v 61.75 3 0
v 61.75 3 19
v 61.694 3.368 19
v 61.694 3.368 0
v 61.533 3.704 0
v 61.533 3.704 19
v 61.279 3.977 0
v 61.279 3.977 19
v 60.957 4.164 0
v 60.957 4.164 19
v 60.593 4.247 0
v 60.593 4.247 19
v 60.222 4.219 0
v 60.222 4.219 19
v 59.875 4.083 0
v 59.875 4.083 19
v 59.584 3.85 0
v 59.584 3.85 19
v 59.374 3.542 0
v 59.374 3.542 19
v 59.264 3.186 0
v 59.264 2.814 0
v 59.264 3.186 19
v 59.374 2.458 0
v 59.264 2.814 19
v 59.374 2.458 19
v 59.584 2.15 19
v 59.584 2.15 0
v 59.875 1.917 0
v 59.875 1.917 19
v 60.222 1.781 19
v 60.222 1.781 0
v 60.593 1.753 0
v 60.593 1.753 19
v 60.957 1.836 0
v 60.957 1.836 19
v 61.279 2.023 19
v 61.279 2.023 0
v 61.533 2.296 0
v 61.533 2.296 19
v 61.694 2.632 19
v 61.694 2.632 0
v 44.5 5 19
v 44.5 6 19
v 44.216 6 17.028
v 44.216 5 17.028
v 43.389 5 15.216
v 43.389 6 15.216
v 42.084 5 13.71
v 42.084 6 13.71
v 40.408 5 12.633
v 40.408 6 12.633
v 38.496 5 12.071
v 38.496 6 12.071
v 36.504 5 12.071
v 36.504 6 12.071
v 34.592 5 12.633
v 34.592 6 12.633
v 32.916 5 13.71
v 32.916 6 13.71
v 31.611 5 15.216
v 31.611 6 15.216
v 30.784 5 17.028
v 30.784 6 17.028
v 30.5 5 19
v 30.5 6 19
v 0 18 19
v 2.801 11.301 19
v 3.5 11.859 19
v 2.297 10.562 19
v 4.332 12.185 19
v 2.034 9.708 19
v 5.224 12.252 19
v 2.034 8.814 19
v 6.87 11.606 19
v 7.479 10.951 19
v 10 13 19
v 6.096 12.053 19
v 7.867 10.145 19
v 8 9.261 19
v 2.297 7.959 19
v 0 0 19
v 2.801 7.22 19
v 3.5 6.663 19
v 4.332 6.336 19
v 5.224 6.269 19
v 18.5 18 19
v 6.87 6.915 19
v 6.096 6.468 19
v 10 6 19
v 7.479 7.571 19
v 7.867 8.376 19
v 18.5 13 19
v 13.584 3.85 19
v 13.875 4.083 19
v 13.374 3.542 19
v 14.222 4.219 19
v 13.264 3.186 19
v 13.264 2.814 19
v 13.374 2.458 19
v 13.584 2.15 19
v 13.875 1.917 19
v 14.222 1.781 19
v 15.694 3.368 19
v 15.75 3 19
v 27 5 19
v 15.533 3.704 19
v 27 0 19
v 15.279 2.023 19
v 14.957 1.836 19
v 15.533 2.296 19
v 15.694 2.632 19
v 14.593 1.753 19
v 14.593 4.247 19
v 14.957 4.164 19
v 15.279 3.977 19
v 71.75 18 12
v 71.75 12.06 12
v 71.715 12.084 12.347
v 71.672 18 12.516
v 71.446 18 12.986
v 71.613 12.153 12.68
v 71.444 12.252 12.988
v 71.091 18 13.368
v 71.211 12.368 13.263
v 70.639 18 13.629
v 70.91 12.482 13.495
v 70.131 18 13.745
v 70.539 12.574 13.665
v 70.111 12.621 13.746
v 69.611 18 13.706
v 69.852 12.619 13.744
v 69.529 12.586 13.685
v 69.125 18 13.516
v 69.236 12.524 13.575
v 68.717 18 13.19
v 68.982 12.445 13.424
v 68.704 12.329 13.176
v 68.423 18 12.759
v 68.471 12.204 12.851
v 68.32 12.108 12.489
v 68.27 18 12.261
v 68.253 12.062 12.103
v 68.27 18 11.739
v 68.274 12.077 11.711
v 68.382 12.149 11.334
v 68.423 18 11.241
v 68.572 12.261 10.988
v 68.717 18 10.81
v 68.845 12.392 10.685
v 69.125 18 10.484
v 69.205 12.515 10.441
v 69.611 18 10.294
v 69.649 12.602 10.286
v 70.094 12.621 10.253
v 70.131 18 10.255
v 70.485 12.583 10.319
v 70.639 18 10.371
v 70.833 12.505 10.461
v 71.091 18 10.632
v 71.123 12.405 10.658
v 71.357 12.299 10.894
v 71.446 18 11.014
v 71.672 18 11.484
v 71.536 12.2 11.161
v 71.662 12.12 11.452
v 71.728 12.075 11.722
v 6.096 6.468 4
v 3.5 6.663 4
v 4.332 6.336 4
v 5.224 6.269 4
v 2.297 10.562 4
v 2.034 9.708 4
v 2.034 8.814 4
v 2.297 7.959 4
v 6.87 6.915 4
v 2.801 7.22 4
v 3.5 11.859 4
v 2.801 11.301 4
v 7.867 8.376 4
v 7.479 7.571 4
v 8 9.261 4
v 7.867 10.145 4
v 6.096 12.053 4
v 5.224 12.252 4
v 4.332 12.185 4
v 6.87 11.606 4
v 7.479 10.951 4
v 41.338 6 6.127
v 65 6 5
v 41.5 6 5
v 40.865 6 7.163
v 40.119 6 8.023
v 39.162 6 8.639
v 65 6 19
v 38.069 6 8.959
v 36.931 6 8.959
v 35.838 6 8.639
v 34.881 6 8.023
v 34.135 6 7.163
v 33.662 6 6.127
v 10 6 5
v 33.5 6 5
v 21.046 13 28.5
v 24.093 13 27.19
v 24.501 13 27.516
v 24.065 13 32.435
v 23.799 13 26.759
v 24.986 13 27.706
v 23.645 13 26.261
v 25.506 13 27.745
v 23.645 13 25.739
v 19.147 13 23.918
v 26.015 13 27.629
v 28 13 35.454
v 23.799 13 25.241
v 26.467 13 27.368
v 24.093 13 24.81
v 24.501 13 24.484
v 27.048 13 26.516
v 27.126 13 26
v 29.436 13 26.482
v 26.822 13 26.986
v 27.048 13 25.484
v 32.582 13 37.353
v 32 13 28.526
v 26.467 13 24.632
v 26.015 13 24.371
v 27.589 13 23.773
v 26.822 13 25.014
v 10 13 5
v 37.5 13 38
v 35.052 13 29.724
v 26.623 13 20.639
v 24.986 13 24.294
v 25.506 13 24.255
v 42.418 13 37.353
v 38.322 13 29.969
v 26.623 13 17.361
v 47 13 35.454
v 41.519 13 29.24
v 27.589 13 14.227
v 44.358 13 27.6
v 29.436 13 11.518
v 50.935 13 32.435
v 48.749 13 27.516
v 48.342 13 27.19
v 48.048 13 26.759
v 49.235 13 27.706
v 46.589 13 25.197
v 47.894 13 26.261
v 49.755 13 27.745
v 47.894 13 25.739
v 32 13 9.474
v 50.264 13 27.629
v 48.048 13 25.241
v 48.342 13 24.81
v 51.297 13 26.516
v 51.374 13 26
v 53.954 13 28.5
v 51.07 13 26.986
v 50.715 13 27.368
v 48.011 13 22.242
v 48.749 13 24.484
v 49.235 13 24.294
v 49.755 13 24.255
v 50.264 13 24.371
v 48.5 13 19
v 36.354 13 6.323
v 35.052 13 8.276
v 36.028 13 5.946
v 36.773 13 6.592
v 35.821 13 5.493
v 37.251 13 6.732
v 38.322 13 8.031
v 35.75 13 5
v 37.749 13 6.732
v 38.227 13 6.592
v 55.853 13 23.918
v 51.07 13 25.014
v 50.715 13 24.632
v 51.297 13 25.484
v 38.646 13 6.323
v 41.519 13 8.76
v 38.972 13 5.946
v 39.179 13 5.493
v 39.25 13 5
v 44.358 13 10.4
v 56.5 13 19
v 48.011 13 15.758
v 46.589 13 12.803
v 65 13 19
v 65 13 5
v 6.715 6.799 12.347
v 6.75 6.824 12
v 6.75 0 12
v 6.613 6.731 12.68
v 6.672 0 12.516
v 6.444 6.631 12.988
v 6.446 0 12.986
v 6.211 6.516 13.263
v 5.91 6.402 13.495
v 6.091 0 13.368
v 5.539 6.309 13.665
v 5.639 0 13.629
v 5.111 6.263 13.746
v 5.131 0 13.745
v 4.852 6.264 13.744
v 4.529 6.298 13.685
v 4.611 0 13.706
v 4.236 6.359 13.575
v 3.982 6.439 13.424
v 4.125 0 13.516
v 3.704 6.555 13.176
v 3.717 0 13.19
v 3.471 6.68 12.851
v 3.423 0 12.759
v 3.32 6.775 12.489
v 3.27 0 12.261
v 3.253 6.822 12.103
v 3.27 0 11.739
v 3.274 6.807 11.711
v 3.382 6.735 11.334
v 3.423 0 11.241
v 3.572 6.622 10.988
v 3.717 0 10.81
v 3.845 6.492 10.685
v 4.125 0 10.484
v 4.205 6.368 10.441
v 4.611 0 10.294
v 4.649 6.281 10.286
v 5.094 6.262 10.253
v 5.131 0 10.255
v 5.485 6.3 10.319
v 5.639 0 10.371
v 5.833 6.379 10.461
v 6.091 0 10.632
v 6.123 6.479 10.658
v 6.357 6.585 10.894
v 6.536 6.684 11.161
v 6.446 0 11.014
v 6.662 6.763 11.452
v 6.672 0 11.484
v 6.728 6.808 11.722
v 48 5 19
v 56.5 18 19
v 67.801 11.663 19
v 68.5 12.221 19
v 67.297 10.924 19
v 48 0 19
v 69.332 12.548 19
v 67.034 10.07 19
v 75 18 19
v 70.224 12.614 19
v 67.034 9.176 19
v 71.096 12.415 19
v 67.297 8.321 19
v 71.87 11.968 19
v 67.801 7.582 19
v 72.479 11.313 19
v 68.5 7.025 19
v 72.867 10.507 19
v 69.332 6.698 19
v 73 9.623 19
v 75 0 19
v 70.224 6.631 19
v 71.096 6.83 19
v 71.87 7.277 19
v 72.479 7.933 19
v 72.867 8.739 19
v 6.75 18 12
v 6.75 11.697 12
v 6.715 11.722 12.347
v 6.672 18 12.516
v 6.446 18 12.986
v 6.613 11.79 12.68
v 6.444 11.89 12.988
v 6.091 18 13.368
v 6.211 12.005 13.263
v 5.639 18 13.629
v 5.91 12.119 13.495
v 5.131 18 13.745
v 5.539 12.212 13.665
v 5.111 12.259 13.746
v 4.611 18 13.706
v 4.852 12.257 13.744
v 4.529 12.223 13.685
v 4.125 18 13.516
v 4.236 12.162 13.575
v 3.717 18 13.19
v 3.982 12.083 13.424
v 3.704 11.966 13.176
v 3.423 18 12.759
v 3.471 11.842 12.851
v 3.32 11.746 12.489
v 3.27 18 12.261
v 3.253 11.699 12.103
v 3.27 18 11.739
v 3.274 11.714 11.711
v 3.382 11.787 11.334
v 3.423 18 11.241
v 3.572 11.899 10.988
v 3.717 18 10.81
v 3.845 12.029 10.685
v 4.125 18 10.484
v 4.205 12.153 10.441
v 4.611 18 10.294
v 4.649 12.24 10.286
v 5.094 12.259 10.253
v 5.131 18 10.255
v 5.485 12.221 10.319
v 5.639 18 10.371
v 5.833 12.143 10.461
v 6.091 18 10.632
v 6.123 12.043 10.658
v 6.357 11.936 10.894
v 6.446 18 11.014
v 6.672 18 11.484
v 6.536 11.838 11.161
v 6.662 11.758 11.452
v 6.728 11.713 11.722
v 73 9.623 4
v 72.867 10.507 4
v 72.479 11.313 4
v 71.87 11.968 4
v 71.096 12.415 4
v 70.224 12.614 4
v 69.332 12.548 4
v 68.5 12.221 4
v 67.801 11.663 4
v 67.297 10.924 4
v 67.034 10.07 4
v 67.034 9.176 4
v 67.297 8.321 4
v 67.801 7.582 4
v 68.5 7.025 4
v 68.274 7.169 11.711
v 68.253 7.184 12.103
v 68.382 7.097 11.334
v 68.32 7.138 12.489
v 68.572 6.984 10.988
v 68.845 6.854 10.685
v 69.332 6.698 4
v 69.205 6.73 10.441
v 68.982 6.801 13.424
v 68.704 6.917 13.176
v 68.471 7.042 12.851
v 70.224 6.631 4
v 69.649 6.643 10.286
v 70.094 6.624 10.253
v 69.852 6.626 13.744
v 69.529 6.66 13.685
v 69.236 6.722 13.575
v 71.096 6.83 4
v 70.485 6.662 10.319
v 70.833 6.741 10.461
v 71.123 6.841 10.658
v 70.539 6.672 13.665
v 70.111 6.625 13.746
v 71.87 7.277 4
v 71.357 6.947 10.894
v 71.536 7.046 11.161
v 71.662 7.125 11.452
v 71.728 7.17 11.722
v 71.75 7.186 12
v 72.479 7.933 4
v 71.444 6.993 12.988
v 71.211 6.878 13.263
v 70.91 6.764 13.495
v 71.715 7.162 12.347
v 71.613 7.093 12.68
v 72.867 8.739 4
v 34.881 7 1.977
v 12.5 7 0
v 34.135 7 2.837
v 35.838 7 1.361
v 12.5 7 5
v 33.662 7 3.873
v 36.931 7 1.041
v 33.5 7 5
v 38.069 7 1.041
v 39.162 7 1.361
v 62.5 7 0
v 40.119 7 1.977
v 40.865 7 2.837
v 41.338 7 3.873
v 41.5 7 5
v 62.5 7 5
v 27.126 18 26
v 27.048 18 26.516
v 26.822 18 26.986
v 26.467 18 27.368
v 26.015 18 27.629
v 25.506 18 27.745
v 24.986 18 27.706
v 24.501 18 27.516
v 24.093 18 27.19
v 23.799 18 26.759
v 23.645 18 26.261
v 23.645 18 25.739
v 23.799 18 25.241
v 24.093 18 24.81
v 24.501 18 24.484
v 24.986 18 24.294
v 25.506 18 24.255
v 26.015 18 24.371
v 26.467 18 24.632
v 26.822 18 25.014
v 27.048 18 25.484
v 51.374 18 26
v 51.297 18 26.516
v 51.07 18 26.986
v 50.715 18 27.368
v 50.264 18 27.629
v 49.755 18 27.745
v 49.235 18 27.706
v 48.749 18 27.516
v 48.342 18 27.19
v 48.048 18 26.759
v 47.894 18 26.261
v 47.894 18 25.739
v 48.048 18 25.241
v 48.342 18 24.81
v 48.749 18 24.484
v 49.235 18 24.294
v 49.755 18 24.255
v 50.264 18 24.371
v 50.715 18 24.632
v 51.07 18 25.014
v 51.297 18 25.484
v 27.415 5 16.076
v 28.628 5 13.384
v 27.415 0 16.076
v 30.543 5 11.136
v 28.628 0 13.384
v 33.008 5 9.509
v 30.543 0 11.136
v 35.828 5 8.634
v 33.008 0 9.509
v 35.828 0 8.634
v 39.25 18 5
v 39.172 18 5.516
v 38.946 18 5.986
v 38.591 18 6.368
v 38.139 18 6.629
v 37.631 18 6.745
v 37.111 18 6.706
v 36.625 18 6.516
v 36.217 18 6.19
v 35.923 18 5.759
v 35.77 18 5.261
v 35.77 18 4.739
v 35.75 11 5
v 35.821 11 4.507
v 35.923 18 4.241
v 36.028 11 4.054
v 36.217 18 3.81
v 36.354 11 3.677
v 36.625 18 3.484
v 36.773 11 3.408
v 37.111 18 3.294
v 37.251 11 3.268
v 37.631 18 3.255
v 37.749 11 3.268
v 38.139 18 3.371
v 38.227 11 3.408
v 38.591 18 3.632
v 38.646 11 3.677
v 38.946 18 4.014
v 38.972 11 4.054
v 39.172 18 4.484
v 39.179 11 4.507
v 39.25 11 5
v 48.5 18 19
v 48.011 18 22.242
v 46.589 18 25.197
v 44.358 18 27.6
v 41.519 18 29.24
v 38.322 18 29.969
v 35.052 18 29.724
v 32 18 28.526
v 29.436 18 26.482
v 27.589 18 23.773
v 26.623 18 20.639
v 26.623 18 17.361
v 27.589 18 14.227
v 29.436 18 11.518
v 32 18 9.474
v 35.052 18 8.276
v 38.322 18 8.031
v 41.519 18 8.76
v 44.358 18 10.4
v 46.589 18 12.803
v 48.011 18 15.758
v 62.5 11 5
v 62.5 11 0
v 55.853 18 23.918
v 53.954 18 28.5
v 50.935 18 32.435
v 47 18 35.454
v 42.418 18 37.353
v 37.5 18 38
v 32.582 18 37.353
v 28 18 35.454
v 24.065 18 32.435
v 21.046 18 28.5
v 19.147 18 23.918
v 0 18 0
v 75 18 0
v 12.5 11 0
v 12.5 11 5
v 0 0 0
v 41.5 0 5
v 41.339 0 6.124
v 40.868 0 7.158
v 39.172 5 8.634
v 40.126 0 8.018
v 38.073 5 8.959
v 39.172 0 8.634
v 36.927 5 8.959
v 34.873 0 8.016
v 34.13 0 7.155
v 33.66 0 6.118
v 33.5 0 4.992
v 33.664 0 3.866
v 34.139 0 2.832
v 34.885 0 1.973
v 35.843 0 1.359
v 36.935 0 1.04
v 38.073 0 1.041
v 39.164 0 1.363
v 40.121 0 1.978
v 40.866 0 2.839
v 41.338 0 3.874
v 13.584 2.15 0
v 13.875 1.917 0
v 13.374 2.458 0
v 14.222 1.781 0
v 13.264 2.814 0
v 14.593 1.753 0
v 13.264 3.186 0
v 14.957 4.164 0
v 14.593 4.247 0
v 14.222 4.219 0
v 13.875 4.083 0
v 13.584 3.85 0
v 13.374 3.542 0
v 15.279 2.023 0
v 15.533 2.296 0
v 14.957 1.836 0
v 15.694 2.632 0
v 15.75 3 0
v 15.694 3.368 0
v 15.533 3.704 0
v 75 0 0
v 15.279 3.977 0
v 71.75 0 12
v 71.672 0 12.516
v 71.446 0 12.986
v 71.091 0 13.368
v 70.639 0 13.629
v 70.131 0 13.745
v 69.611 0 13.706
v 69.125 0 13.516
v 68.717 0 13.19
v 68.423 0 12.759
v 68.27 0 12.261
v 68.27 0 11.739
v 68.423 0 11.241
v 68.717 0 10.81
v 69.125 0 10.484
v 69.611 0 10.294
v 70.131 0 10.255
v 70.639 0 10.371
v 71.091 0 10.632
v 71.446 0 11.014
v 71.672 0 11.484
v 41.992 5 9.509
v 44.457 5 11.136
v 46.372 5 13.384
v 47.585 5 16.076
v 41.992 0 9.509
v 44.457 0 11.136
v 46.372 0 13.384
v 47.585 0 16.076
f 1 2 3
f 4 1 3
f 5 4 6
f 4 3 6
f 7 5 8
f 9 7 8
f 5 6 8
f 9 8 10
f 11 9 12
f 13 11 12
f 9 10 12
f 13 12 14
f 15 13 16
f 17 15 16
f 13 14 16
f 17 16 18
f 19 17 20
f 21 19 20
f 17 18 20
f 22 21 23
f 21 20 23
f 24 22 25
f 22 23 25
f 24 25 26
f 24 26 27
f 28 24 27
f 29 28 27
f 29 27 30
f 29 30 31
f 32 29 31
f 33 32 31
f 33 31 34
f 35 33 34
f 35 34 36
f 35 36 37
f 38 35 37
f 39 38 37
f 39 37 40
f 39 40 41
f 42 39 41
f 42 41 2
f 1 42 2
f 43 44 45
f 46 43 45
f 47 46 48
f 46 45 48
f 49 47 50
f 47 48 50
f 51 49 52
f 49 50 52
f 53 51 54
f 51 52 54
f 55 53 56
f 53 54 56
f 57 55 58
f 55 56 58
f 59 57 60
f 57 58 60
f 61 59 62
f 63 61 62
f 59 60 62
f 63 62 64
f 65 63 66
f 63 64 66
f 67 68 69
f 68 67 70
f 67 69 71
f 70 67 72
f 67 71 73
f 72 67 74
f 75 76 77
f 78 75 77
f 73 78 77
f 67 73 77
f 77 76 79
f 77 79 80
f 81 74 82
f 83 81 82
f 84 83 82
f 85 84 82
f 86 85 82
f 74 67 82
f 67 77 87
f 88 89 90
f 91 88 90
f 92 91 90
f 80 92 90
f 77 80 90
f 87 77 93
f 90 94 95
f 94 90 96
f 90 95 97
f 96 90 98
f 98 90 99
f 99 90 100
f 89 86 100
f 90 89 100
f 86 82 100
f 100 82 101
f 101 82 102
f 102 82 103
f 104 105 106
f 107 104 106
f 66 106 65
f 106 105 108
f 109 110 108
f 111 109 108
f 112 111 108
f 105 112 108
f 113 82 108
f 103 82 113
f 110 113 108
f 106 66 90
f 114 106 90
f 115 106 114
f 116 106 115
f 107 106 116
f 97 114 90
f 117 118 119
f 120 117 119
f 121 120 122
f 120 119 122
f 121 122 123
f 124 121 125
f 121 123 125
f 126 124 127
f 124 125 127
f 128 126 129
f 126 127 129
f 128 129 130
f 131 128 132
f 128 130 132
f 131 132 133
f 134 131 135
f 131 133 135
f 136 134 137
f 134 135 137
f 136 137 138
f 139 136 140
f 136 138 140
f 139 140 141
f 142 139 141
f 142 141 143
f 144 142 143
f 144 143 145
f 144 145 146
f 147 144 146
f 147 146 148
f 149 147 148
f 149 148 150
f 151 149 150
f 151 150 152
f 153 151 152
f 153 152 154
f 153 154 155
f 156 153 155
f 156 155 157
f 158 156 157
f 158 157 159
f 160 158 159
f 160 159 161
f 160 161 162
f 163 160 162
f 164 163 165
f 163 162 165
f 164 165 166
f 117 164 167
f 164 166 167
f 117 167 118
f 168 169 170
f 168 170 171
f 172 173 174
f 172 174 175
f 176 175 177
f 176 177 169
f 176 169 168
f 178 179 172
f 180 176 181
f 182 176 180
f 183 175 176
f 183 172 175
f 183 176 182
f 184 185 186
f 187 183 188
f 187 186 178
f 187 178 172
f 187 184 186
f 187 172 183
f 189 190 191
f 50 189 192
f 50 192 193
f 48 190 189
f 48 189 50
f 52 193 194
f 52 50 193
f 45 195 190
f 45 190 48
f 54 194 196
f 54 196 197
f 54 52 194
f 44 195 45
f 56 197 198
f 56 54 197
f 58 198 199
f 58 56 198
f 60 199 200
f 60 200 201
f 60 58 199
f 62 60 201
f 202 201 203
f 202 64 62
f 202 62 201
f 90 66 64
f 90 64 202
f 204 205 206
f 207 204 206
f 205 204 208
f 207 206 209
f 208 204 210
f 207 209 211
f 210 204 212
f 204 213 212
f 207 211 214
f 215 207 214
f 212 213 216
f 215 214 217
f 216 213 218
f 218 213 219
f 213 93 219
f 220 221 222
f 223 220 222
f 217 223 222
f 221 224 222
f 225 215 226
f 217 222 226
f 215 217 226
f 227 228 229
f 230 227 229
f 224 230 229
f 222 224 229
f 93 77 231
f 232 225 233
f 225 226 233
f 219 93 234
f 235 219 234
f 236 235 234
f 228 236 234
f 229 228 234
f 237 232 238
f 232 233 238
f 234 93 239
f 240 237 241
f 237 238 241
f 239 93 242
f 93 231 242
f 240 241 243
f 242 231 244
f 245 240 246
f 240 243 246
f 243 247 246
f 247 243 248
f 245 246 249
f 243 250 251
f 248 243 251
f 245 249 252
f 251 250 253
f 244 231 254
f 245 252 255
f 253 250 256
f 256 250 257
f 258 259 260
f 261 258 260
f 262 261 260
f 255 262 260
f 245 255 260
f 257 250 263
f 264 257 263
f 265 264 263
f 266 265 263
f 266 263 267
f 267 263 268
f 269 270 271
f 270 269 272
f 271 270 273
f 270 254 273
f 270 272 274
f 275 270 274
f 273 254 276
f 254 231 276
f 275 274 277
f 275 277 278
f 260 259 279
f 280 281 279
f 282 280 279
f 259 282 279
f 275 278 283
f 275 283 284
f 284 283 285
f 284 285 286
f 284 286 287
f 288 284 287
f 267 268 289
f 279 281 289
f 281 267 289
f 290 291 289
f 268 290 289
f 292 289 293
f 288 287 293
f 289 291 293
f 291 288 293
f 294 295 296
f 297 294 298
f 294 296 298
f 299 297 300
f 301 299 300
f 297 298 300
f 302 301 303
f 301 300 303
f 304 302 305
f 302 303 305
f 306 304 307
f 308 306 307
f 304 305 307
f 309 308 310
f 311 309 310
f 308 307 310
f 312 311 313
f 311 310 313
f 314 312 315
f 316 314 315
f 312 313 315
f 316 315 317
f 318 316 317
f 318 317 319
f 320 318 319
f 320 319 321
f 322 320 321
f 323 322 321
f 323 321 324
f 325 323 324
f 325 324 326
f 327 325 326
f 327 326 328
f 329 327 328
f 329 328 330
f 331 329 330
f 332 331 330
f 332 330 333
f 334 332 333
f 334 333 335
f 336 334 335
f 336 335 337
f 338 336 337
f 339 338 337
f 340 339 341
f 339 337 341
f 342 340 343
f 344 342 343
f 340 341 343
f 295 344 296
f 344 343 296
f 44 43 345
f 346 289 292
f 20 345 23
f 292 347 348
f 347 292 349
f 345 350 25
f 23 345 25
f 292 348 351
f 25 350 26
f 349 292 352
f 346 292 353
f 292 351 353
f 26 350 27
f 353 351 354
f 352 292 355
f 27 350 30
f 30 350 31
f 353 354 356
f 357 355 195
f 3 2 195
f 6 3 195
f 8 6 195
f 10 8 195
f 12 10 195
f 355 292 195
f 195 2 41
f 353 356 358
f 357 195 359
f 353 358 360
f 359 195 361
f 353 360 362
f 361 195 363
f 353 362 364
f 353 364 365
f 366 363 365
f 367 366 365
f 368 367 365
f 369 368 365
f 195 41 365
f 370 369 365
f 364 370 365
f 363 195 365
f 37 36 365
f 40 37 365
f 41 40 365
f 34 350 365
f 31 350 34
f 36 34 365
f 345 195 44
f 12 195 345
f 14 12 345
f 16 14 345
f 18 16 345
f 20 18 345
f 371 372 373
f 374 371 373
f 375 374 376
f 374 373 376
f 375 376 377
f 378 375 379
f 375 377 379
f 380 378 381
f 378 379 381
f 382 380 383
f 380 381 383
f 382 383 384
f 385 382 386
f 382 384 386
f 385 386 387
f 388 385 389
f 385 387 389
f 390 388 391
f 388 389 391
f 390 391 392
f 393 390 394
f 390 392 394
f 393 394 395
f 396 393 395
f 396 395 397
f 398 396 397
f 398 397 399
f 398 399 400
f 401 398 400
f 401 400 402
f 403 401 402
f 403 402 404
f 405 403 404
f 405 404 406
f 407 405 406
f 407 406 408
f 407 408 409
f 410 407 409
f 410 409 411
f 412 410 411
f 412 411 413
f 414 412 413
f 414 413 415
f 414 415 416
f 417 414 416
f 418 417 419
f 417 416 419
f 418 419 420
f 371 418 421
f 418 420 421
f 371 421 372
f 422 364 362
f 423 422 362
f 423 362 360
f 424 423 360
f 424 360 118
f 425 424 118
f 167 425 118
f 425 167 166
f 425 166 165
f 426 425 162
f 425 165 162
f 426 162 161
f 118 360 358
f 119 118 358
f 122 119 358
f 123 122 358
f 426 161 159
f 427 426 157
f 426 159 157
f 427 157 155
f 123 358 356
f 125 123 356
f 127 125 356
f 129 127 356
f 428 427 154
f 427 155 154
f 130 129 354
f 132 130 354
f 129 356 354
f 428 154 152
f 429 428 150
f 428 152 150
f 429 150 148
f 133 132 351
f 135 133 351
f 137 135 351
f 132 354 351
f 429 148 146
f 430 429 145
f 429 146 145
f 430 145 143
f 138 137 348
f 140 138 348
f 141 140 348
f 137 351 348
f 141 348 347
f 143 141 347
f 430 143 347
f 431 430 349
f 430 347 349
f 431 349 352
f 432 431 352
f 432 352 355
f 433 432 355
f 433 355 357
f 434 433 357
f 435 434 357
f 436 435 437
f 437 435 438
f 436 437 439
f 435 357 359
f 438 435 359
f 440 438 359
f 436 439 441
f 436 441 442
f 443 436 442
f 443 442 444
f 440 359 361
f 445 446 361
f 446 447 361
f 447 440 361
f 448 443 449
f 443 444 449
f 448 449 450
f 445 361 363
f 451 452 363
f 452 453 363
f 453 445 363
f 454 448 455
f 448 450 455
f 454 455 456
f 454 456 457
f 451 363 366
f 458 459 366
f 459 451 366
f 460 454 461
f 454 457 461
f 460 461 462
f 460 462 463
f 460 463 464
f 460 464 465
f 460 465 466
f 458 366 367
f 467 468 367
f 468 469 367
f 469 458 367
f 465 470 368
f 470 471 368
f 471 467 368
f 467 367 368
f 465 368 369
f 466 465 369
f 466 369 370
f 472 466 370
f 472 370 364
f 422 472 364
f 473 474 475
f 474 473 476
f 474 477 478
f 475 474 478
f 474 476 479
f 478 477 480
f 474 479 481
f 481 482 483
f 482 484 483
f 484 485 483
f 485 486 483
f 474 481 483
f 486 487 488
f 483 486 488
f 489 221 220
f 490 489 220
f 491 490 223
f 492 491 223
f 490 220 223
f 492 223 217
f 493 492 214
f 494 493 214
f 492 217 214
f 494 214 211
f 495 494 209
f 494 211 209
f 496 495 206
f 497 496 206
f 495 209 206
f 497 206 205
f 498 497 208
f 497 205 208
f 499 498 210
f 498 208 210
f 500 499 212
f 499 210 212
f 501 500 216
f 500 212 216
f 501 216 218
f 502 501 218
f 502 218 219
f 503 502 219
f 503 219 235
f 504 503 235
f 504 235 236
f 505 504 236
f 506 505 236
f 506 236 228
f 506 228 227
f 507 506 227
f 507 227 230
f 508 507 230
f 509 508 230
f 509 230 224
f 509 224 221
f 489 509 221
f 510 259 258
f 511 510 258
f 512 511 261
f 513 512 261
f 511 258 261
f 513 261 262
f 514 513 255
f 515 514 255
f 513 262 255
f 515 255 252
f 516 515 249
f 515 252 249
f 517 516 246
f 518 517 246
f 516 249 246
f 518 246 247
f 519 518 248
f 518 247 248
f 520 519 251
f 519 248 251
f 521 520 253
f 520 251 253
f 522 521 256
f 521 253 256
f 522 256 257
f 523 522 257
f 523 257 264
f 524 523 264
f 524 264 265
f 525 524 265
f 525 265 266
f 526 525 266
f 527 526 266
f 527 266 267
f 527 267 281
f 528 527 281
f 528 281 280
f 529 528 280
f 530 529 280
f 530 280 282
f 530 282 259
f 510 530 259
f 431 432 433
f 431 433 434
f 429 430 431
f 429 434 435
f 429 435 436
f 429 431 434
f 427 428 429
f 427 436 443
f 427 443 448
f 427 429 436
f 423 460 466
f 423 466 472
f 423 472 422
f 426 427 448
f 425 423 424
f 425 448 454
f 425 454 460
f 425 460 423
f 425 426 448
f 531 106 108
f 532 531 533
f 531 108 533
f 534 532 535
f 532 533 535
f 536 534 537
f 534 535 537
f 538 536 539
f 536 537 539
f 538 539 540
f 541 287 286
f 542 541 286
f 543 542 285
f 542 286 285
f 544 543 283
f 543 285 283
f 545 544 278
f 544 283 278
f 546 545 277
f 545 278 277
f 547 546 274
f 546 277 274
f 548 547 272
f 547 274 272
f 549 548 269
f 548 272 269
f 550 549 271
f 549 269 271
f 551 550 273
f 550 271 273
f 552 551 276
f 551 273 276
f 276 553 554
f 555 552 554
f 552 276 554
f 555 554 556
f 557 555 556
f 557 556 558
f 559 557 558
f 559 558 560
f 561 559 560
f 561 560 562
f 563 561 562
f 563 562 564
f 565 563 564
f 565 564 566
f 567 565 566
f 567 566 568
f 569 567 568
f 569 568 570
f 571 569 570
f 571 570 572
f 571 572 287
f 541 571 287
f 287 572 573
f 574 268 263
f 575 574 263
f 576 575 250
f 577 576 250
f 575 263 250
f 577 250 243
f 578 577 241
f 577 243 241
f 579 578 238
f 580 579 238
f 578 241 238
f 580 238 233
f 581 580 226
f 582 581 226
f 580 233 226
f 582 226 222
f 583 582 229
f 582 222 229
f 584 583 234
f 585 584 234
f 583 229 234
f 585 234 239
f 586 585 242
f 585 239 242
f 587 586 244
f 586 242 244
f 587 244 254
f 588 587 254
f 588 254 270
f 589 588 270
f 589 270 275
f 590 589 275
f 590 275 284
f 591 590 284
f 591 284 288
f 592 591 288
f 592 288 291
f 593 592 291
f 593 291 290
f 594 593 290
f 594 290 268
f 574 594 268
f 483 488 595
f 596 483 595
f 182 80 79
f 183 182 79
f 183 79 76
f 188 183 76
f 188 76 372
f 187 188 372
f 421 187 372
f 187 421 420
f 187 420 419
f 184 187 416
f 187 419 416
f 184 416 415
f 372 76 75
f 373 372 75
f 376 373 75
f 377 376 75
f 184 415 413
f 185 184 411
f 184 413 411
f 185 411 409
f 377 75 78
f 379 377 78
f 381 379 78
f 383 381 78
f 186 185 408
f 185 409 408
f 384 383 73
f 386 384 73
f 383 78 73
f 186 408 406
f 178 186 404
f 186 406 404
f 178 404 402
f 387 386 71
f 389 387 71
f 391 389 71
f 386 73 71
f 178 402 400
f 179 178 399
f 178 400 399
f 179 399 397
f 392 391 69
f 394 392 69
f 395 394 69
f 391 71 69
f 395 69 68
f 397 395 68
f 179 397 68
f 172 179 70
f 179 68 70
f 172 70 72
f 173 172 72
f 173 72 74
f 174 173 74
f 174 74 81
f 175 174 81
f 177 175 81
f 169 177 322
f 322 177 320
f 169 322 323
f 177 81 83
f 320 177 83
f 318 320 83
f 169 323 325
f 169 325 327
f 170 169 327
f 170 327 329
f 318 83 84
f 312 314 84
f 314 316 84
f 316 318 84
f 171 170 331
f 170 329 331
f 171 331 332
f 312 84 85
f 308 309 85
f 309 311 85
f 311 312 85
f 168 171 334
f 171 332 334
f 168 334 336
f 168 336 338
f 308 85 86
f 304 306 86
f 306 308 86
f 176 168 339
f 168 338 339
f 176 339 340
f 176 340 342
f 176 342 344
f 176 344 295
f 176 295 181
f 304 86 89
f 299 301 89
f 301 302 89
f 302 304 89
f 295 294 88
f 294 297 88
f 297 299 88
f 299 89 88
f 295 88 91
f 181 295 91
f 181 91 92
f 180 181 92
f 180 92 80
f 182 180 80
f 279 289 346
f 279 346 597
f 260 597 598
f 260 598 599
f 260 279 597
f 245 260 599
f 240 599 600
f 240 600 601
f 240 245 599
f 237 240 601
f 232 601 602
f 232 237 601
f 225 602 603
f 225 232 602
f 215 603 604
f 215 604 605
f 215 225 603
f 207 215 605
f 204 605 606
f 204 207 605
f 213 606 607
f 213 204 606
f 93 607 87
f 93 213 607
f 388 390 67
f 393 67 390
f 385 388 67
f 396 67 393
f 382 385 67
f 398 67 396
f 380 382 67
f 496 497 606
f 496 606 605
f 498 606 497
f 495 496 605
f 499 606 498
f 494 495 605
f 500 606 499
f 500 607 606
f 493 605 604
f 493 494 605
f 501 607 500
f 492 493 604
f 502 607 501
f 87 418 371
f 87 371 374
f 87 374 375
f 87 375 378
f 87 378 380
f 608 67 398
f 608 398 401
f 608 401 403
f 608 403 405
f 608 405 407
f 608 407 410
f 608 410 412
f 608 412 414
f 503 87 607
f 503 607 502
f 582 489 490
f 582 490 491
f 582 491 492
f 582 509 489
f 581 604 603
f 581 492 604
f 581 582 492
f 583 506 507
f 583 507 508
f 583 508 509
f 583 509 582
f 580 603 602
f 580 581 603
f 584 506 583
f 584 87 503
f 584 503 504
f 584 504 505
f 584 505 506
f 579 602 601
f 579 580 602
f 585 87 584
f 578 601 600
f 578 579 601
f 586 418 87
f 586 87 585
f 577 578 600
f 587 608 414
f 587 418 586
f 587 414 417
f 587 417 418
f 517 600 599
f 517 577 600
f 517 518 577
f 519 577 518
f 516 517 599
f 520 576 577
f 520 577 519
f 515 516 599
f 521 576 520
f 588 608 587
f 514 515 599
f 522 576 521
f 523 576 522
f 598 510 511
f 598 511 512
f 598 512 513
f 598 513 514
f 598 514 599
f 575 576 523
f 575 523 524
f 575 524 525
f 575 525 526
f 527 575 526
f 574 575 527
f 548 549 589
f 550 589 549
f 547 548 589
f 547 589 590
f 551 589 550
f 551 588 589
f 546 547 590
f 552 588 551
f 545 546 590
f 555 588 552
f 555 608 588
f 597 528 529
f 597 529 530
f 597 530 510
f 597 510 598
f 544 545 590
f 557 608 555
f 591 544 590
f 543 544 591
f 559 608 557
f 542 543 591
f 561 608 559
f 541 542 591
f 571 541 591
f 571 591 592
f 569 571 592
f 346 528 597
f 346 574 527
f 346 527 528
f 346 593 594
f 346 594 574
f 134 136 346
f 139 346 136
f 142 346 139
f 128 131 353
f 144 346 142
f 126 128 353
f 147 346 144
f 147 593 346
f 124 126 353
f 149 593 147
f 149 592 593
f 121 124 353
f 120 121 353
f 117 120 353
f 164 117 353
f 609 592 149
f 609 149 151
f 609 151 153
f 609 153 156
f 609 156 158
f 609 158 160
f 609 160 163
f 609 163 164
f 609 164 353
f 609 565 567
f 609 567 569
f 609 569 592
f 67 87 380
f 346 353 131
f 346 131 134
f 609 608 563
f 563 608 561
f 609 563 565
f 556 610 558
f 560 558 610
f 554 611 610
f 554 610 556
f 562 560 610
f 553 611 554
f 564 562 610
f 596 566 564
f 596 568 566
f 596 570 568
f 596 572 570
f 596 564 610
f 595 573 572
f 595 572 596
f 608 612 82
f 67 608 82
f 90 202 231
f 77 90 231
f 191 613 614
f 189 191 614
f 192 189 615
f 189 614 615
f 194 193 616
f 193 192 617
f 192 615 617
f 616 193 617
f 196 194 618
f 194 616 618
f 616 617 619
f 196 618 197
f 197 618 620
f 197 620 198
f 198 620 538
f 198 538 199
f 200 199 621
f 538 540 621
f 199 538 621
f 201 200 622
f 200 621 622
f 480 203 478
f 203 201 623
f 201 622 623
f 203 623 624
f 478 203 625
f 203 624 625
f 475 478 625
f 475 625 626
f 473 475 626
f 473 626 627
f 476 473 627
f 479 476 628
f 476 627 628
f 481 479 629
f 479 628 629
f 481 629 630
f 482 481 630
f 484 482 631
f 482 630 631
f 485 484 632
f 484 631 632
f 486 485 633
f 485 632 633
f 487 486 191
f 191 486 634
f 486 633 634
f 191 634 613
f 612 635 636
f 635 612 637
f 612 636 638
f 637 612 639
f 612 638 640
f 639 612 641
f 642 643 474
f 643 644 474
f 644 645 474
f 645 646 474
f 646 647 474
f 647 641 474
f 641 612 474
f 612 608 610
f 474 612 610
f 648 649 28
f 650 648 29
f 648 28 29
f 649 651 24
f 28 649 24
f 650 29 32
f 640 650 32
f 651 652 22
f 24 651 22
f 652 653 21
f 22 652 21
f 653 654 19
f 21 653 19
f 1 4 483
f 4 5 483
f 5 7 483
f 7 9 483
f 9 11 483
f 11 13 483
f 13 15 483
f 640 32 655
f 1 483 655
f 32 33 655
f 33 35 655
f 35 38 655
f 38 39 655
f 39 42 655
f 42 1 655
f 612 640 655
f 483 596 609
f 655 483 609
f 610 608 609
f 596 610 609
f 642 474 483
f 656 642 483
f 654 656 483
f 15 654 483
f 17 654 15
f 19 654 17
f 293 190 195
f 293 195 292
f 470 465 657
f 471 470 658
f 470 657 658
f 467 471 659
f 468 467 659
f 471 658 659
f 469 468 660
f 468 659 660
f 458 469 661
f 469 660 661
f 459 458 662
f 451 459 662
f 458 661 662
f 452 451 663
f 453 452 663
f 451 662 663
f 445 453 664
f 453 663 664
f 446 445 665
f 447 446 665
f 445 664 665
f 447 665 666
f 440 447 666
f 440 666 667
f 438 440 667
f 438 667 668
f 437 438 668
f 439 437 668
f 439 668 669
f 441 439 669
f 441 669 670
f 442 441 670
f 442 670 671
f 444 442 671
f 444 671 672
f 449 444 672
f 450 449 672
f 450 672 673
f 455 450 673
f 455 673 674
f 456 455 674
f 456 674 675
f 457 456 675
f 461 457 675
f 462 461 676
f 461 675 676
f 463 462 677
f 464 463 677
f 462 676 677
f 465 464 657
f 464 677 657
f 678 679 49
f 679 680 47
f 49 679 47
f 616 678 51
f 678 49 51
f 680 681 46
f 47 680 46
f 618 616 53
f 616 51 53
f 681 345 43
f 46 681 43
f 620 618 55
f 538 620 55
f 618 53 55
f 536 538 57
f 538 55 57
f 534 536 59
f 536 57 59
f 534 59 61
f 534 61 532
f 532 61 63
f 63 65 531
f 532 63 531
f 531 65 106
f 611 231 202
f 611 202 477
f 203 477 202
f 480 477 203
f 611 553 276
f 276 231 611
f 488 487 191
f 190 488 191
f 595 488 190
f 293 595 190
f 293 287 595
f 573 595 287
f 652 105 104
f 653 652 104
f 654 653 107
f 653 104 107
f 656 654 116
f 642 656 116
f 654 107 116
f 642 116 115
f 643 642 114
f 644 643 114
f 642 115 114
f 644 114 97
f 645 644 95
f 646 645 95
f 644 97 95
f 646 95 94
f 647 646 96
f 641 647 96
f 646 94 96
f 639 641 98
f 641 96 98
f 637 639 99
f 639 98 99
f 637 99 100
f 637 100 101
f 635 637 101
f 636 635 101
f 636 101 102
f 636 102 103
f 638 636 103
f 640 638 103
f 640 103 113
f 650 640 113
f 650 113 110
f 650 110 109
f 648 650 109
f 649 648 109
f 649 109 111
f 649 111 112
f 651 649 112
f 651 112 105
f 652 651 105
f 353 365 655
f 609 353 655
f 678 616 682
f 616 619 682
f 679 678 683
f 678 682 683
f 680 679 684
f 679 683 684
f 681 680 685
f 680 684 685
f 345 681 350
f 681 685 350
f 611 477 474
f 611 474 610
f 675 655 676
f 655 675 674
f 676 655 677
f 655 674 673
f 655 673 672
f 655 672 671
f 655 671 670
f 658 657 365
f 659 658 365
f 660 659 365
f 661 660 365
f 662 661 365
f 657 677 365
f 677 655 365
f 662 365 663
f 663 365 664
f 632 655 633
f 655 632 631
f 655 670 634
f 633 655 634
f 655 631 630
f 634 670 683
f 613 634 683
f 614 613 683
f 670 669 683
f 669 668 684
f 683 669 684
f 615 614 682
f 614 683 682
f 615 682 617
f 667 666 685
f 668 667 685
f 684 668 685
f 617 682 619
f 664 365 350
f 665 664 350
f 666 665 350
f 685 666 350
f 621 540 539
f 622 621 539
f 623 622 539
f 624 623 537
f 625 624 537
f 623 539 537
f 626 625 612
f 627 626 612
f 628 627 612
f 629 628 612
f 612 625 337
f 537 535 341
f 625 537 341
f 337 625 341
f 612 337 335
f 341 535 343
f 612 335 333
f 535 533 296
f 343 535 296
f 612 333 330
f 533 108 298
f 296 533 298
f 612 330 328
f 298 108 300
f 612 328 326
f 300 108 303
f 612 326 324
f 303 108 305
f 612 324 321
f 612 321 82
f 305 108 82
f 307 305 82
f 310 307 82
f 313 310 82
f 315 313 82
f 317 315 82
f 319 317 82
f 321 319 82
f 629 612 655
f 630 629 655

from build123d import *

# Parameters (mm, degrees)
SKETCH_W        = 75
SKETCH_H        = 18
PAD_DEPTH       = 5
SKETCH001_W     = 50
SKETCH001_H     = 4
POCKET_DEPTH    = 5.001
SKETCH002_W     = 75
SKETCH002_H     = 5
PAD001_DEPTH    = 38
POCKET001_DEPTH = 5
SKETCH004_R     = 11
POCKET002_DEPTH = 5.001
SKETCH005_R     = 10.5
PAD002_DEPTH    = 6
SKETCH006_W     = 10
SKETCH006_H     = 18
PAD003_DEPTH    = 14
SKETCH007_R     = 3
POCKET003_DEPTH = 15
SKETCH008_R     = 16
SKETCH008_R_2   = 7
PAD004_DEPTH    = 1
SKETCH009_R     = 1.75
POCKET004_DEPTH = 18.001
SKETCH010_R     = 4
POCKET005_DEPTH = 8
SKETCH011_R     = 1.75
POCKET006_DEPTH = 18.001
SKETCH012_W     = 100
SKETCH012_H     = 30
POCKET007_DEPTH = 6
SKETCH013_R     = 1.25
HOLE_DEPTH      = 25


with BuildPart() as part:
    # Sketch → Pad (new body)
    with BuildSketch(Plane.XY):
        with Locations((37.5, 9)):
            Rectangle(SKETCH_W, SKETCH_H)
    extrude(amount=PAD_DEPTH)

    # Sketch001 (on Face6 of Pad) → Pocket (cut, through all)
    with BuildSketch(Plane.XY.offset(5)):
        with Locations((37.5, 9)):
            Rectangle(SKETCH001_W, SKETCH001_H)
    extrude(amount=-POCKET_DEPTH, mode=Mode.SUBTRACT)

    # Sketch002 (on Face5 of Pocket) → Pad001 (join)
    with BuildSketch(Plane.XY.offset(5)):
        with Locations((37.5, 15.5)):
            Rectangle(SKETCH002_W, SKETCH002_H)
    extrude(amount=PAD001_DEPTH)

    # Sketch003 (on Face13 of Pad001) → Pocket001 (cut)
    with BuildSketch(Plane.XZ.offset(-13)):
        with BuildLine():
            ThreePointArc((56.5, 19), (37.5, 38), (18.5, 19))
            Line((18.5, 19), (-1.5, 19))
            Line((-1.5, 19), (-1.5, 49))
            Line((-1.5, 49), (76.5, 49))
            Line((76.5, 49), (76.5, 19))
            Line((76.5, 19), (56.5, 19))
        make_face()
    extrude(amount=-POCKET001_DEPTH, mode=Mode.SUBTRACT)

    # Sketch004 → Pocket002 (cut, through all)
    with BuildSketch(Plane.XZ.offset(-13)):
        with Locations((37.5, 19)):
            Circle(SKETCH004_R)
    extrude(amount=-POCKET002_DEPTH, mode=Mode.SUBTRACT)

    # Sketch005 (on Face1 of Pocket002) → Pad002 (join)
    with BuildSketch(Plane.XZ):
        with BuildLine():
            Line((56.5, 19), (75, 19))
            Line((75, 19), (75, 0))
            Line((75, 0), (0, 0))
            Line((0, 0), (0, 19))
            Line((0, 19), (18.5, 19))
            ThreePointArc((56.5, 19), (37.5, 38), (18.5, 19))
        make_face()
        with Locations((37.5, 19)):
            Circle(SKETCH005_R, mode=Mode.SUBTRACT)
    extrude(amount=-PAD002_DEPTH)

    # Sketch006 (on Face8 of Pad002) → Pad003 (join)
    with BuildSketch(Plane.XY.offset(5)):
        with Locations((5, 9)):
            Rectangle(SKETCH006_W, SKETCH006_H)
        with Locations((70, 9)):
            Rectangle(SKETCH006_W, SKETCH006_H)
    extrude(amount=PAD003_DEPTH)

    # Sketch007 (on Face23 of Pad003) → Pocket003 (cut)
    with BuildSketch(Plane.XY.offset(19)):
        with Locations((5, 9.260643)):
            Circle(SKETCH007_R)
        with Locations((70, 9.622806)):
            Circle(SKETCH007_R)
    extrude(amount=-POCKET003_DEPTH, mode=Mode.SUBTRACT)

    # Sketch008 (on Face35 of Pad003) → Pad004 (join)
    with BuildSketch(Plane(origin=(0, 6, 0), x_dir=(-1, 0, 0), z_dir=(0, 1, 0))):
        with Locations((-37.5, 19)):
            Circle(SKETCH008_R)
        with Locations((-37.5, 19)):
            Circle(SKETCH008_R_2, mode=Mode.SUBTRACT)
    extrude(amount=-PAD004_DEPTH)

    # Sketch009 (on Face31 of Pad004) → Pocket004 (cut, through all)
    with BuildSketch(Plane.XZ):
        with Locations((5, 12)):
            Circle(SKETCH009_R)
        with Locations((70, 12)):
            Circle(SKETCH009_R)
    extrude(amount=-POCKET004_DEPTH, mode=Mode.SUBTRACT)

    # Sketch010 (on Face34 of Pocket004) → Pocket005 (cut)
    with BuildSketch(Plane.XZ):
        with Locations((37.5, 5)):
            Circle(SKETCH010_R)
        with Locations((25.375644, 26)):
            Circle(SKETCH010_R)
        with Locations((49.624356, 26)):
            Circle(SKETCH010_R)
    extrude(amount=-POCKET005_DEPTH, mode=Mode.SUBTRACT)

    # Sketch011 (on Face34 of Pocket005) → Pocket006 (cut, through all)
    with BuildSketch(Plane.XZ):
        with Locations((25.375644, 26)):
            Circle(SKETCH011_R)
        with Locations((37.5, 5)):
            Circle(SKETCH011_R)
        with Locations((49.624356, 26)):
            Circle(SKETCH011_R)
    extrude(amount=-POCKET006_DEPTH, mode=Mode.SUBTRACT)

    # Sketch012 (on Face40 of Pocket006) → Pocket007 (cut)
    with BuildSketch(Plane.XZ):
        with Locations((50, 34)):
            Rectangle(SKETCH012_W, SKETCH012_H)
    extrude(amount=-POCKET007_DEPTH, mode=Mode.SUBTRACT)

    # Sketch013 (on Face60 of Pocket007) → Hole (cut)
    with BuildSketch(Plane.XY.offset(19)):
        with Locations((14.5, 3)):
            Circle(SKETCH013_R)
        with Locations((60.5, 3)):
            Circle(SKETCH013_R)
    extrude(amount=-HOLE_DEPTH, mode=Mode.SUBTRACT)


solid = part.part
